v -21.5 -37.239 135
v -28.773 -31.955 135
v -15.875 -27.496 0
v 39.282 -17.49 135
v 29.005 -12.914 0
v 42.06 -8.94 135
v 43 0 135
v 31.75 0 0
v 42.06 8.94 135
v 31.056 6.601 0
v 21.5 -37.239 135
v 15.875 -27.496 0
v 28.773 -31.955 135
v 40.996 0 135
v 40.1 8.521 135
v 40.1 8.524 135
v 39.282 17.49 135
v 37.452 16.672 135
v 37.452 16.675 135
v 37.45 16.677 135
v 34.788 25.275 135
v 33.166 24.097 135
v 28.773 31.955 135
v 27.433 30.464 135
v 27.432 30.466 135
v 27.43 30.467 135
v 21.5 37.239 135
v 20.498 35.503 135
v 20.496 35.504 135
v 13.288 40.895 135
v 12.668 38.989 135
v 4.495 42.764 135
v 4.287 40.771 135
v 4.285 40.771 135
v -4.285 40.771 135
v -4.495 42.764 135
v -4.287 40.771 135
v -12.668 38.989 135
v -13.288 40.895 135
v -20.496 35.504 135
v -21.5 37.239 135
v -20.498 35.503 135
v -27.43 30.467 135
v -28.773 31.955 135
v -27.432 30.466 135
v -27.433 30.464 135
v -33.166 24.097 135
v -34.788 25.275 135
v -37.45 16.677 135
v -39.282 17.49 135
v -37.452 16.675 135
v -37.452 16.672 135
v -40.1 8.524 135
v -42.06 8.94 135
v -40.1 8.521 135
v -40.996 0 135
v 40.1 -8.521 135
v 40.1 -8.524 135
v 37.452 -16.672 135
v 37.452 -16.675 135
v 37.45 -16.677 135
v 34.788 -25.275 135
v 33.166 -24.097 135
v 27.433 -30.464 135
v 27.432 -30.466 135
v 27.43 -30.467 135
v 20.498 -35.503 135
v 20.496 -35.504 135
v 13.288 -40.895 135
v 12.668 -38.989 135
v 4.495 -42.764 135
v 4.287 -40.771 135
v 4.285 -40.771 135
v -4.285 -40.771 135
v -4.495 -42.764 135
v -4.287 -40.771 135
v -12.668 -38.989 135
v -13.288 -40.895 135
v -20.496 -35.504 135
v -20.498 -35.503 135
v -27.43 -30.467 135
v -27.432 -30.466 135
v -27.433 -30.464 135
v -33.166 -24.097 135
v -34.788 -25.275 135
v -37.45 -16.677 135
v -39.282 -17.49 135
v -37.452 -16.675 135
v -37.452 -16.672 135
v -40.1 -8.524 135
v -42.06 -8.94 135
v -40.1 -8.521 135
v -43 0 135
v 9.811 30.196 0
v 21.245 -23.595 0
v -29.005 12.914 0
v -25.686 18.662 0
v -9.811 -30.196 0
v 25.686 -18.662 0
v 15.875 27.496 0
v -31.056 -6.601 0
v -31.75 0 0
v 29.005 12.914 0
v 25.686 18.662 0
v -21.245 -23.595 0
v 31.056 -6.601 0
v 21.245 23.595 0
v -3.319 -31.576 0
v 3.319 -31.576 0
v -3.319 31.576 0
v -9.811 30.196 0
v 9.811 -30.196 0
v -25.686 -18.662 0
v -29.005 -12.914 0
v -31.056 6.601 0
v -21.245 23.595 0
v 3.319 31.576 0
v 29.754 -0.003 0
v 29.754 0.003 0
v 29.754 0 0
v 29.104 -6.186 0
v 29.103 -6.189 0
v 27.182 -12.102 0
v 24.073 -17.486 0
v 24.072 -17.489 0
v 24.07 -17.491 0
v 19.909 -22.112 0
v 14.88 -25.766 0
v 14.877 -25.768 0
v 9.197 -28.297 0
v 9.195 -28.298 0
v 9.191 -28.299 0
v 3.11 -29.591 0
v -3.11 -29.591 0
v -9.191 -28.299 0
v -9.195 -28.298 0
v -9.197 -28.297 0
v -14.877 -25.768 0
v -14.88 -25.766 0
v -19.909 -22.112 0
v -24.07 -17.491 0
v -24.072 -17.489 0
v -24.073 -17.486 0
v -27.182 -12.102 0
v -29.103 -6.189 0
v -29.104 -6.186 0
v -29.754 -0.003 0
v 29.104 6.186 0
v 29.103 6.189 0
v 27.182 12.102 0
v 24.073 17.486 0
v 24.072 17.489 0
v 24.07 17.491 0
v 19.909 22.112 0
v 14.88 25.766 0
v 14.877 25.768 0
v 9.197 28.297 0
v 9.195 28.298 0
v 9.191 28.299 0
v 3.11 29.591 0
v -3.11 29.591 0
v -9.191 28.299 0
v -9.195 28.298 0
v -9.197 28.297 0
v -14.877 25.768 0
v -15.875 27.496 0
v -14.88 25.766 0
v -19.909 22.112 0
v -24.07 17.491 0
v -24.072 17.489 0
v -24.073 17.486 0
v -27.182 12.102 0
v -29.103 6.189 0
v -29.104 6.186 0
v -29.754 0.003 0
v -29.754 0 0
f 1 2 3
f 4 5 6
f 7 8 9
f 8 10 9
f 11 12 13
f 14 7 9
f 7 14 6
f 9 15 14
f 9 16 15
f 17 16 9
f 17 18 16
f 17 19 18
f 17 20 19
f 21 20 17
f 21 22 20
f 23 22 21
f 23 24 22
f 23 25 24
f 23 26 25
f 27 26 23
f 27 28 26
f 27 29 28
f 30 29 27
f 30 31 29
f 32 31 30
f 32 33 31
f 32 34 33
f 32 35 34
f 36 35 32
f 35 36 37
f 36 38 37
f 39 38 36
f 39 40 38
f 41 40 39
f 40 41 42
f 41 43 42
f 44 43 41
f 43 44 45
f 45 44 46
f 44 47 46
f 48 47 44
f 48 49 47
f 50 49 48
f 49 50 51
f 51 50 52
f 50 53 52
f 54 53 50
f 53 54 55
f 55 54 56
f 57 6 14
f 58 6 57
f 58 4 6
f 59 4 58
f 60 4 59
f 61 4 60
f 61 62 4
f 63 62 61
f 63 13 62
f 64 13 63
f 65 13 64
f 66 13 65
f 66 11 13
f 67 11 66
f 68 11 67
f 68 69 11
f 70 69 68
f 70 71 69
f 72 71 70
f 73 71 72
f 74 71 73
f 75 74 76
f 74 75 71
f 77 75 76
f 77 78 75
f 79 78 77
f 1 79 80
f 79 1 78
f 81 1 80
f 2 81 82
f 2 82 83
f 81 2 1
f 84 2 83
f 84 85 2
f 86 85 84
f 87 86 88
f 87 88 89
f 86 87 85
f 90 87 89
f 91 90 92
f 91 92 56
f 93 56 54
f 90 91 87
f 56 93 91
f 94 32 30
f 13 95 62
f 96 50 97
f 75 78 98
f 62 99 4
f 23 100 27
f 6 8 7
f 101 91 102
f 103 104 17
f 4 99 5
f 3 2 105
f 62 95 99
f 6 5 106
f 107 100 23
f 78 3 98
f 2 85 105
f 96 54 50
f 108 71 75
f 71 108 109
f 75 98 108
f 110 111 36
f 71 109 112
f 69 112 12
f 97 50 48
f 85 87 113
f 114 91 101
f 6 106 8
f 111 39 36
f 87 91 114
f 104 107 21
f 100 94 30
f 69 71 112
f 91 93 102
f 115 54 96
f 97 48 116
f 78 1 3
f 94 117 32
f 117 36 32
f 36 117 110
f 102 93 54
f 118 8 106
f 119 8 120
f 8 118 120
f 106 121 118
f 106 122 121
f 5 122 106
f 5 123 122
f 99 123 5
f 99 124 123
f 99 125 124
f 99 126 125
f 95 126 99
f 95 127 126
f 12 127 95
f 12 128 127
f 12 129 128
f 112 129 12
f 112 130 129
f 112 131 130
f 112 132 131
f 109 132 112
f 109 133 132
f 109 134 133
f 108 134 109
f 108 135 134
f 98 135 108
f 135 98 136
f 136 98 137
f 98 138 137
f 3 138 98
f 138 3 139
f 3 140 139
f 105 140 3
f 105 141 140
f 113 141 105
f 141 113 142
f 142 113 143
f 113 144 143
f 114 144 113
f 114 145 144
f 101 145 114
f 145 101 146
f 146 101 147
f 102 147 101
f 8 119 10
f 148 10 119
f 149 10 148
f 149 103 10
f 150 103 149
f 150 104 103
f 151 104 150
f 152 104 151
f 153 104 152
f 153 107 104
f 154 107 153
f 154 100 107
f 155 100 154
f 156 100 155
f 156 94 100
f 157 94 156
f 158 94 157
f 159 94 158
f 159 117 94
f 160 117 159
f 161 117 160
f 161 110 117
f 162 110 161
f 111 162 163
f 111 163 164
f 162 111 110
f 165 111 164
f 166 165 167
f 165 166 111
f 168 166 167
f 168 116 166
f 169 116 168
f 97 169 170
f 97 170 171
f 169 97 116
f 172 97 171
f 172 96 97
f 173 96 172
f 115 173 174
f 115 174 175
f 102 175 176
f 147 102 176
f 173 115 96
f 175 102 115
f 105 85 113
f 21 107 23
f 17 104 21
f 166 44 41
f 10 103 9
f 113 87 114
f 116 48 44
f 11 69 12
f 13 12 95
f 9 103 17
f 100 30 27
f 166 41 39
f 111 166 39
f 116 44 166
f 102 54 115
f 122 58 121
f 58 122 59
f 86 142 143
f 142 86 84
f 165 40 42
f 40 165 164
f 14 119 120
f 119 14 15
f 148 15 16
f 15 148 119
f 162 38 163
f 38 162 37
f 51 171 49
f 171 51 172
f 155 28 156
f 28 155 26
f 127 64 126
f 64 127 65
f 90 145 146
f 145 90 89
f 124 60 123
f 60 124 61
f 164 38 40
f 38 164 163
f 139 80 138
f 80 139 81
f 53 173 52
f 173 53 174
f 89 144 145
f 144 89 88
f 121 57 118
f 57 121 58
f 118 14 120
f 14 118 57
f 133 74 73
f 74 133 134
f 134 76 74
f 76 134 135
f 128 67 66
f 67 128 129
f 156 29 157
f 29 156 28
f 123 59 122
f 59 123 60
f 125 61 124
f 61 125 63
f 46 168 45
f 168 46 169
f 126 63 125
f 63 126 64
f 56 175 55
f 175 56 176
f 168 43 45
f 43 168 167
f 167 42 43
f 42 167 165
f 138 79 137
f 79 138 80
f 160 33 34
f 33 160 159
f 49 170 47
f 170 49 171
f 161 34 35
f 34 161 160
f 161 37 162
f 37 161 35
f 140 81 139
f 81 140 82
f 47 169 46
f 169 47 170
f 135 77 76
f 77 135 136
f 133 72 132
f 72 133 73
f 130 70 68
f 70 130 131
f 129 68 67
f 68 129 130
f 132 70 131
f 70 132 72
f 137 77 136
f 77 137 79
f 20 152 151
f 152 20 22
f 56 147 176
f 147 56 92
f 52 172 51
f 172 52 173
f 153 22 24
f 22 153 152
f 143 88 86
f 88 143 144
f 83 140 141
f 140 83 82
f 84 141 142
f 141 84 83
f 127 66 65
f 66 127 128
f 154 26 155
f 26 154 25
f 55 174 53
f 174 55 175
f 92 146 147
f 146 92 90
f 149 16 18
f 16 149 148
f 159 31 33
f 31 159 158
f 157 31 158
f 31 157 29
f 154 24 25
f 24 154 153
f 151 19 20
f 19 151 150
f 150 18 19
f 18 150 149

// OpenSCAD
//Start with Cup Dimensions - these are for a Starbucks $1 Reusable Cup
bottom_diameter=59.5;
top_diameter=82;
//Make sure the height is measured as the distance between your top and bottom radius measurements!
height=135;

//Now some basic properties of your sleeve
color="aqua"; //[black,silver,gray,white,maroon,red,purple,fuchsia,green,lime,olive,yellow,navy,blue,teal,aqua,brown,sienna]
thickness=2; //[1:4]
border=3; //[1:30]
sleeve_height_percent=95;//[10:95]
//Use this to move the sleeve up or down on the cup
sleeve_z_offset=0;

//And finally the pattern variables...
line_thickness=4;
sides=6;//[3:20]
size=18;//[1:20]
overlap=5;//[0:10]
//This is the spin of each shape about its center
spin=22.5;//[-90:90]
//This is the amount the pattern is made to "spiral" around the cup, vs. stack straight up
pattern_spin=9;//[0:10]

part=1;//[1:Render,2:Final]

////////////////////////////////

bottom_radius=bottom_diameter/2;
top_radius=top_diameter/2;
rb=bottom_diameter/2+thickness;
rt=top_diameter/2+thickness;
h=height;
lt=line_thickness;
sh=sleeve_height_percent/100*h;
szo=sleeve_z_offset;

res=30;


theta=atan((rt-rb)/h);
count=24-size;
thetac=360/count;
rpb=rb*3.14/count;
rp=rpb*(1+overlap*.2);

rows=round(h/(2*rpb));
echo(rows);
echo(count);
echo(theta);

cupwall();

module sleeve(){
	color(color)union(){
		intersection(){
			cupwall();
		
			translate([0,0,h/2+szo])cylinder(r=rt*2,h=sh,center=true);
		
			for(i=[0:rows]){
				rotate([0,0,thetac*i/2*pattern_spin/10])
				translate([0,0,2*rpb*i])
				ring();
			}
		}
		
		intersection(){
			cupwall();
			translate([0,0,szo+(h-sh)/2])cylinder(r=rt*2,h=border,$fn=res);
		}
		
		intersection(){
			cupwall();
			translate([0,0,h-border+szo-(h-sh)/2])cylinder(r=rt*2,h=border,$fn=res);
		}
	}
}

module cup(){
	color("white")difference(){
		union(){
			translate([0,0,-.1])cylinder(r1=bottom_radius+.1,r2=top_radius+.1,h=h+.2,$fn=res);
			translate([0,0,h+.2-2.5])cylinder(r=top_radius+1.5,h=2.5,$fn=res);
		}
		translate([0,0,6])cylinder(r1=bottom_radius-1,r2=top_radius-1,h=h+.2,$fn=res);
		translate([0,0,-.2])cylinder(r=bottom_radius-1,h=5,$fn=res);
	}
}


module ring(){
	for(i=[0:count-1])
	rotate([0,0,i*thetac]){
		translate([0,0,rb*tan(theta)+rpb])
		rotate([-90-theta,0,0])
		rotate([0,0,spin])
		difference(){
			cylinder(r1=lt,r2=2*rp,h=2*rb,$fn=sides);
			translate([0,0,-.05])cylinder(r1=0,r2=2*rp-lt,h=2*rb+.1,$fn=sides);
		}
	}
}

module cupwall(){
	difference(){
		cylinder(r1=rb,r2=rt,h=h,$fn=30);
		translate([0,0,-.05])cylinder(r1=bottom_radius,r2=top_radius,h=h+.1,$fn=res);
	}
}
